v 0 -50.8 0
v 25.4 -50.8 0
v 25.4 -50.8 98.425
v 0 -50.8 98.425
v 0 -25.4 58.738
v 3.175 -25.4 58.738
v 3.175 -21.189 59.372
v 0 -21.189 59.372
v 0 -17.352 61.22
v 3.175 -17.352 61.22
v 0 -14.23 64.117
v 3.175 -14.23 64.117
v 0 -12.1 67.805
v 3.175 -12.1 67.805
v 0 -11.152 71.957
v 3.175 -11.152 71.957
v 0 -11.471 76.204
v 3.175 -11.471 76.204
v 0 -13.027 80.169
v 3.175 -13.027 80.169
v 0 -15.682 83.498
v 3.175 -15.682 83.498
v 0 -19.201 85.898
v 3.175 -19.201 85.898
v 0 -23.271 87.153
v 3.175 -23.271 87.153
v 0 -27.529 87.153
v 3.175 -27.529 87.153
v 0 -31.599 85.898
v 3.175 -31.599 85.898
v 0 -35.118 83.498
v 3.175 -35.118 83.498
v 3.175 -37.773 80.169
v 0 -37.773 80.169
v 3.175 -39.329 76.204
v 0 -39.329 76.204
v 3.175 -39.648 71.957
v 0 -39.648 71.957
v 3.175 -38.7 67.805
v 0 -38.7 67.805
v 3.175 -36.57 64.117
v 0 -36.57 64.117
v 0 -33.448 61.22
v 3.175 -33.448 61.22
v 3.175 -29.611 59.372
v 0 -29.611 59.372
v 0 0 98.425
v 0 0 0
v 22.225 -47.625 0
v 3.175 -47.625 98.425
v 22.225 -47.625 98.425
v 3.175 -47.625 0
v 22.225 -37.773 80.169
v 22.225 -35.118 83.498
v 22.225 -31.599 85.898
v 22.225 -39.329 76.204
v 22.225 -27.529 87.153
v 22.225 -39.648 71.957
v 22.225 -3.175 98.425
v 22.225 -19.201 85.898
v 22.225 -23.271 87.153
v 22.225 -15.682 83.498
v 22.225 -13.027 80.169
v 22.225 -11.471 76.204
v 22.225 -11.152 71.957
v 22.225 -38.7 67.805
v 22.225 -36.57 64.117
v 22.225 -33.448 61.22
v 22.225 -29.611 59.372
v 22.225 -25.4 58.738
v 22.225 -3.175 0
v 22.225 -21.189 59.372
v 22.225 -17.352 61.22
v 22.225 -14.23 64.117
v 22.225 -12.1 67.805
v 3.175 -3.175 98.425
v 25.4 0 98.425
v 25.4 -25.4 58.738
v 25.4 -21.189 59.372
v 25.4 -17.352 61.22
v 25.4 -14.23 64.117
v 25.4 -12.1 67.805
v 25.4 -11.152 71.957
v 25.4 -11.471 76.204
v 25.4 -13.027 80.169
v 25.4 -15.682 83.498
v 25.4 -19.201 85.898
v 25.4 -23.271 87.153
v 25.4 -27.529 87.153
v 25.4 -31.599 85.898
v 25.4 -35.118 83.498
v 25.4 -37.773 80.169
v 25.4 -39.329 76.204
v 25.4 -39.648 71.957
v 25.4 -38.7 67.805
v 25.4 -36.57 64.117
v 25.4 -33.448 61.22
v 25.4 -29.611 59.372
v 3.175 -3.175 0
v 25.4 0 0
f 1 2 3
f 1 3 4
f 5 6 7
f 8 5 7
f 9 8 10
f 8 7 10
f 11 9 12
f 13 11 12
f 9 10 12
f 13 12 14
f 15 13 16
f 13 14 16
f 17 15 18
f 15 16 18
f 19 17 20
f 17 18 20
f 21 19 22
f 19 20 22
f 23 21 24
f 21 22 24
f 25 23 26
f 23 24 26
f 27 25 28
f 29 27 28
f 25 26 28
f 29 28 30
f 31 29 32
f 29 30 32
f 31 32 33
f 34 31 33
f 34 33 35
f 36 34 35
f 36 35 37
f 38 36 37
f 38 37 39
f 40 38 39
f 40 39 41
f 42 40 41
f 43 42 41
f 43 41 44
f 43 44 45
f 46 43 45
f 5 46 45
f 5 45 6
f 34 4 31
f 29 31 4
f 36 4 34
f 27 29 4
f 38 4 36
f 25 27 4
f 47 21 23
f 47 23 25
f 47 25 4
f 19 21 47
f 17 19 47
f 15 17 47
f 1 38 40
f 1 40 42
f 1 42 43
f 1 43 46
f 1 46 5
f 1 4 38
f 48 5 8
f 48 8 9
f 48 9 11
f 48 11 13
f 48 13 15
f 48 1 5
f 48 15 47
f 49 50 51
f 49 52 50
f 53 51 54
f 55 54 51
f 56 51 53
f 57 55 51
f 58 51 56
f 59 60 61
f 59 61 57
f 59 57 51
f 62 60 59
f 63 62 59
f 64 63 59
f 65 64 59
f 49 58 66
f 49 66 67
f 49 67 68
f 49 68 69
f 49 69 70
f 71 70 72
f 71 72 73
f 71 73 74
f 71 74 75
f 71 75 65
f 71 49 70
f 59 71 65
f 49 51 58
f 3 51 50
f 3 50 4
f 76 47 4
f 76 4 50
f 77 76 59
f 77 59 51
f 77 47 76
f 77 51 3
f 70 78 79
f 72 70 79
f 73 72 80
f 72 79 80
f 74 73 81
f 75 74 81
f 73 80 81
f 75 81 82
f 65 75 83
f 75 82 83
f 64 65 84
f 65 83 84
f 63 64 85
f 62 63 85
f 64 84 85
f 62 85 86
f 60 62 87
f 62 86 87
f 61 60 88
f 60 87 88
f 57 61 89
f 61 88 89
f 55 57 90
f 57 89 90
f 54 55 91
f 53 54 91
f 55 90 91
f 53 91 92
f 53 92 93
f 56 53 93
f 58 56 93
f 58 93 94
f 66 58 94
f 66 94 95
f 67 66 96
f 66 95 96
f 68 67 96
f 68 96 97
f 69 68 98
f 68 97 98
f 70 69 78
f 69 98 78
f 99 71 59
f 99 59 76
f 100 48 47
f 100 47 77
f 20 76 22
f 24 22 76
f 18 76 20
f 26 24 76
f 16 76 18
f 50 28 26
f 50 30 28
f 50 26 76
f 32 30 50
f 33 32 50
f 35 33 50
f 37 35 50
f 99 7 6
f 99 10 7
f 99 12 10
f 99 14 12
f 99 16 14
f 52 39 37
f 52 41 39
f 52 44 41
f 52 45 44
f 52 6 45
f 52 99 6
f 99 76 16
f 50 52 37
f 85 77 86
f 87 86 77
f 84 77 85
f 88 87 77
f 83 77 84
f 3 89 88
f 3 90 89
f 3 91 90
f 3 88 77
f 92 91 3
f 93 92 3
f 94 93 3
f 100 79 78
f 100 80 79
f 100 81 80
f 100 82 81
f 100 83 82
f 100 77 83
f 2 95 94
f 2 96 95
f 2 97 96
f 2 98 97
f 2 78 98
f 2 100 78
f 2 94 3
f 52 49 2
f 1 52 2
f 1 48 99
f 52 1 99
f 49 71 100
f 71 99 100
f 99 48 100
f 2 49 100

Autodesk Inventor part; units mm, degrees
ref_plane "YZ Plane" through (0, 0, 0) normal (1, 0, 0) x (0, 1, 0)
ref_plane "XZ Plane" through (0, 0, 0) normal (0, 1, 0) x (-1, 0, 0)
ref_plane "XY Plane" through (0, 0, 0) normal (0, 0, 1) x (1, 0, 0)
sketch "Sketch1" plane through (0, 0, 0) normal (0, 0, 1) x (1, 0, 0)
  line L0 (0, 0) -> (25.4, 0)
  line L1 (25.4, 0) -> (25.4, -50.8)
  line L2 (25.4, -50.8) -> (0, -50.8)
  line L3 (0, -50.8) -> (0, 0)
  line L4 (22.225, -3.175) -> (3.175, -3.175)
  line L5 (3.175, -3.175) -> (3.175, -47.625)
  line L6 (3.175, -47.625) -> (22.225, -47.625)
  line L7 (22.225, -47.625) -> (22.225, -3.175)
  dimension "d0" = 25.4
  dimension "d1" = 50.8
  dimension "d2" = 3.175
extrude "Extrusion1" add sketch "Sketch1" along normal blind 98.425
sketch "Sketch3" plane through (25.4, -50.8, 0) normal (1, 0, 0) x (0, 0, -1)
  circle A0 centre (-73.025, 25.4) radius 14.2875
  line L0 (0, 50.8) -> (-98.425, 50.8) projected
  line L1 (-98.425, 0) -> (-98.425, 50.8) projected
  dimension "d15" = 25.4
  dimension "d17" = 25.4
  dimension "d19" = 28.575
extrude "Extrusion3" cut sketch "Sketch3" against normal blind 38.1
properties part number "intake hinge"
